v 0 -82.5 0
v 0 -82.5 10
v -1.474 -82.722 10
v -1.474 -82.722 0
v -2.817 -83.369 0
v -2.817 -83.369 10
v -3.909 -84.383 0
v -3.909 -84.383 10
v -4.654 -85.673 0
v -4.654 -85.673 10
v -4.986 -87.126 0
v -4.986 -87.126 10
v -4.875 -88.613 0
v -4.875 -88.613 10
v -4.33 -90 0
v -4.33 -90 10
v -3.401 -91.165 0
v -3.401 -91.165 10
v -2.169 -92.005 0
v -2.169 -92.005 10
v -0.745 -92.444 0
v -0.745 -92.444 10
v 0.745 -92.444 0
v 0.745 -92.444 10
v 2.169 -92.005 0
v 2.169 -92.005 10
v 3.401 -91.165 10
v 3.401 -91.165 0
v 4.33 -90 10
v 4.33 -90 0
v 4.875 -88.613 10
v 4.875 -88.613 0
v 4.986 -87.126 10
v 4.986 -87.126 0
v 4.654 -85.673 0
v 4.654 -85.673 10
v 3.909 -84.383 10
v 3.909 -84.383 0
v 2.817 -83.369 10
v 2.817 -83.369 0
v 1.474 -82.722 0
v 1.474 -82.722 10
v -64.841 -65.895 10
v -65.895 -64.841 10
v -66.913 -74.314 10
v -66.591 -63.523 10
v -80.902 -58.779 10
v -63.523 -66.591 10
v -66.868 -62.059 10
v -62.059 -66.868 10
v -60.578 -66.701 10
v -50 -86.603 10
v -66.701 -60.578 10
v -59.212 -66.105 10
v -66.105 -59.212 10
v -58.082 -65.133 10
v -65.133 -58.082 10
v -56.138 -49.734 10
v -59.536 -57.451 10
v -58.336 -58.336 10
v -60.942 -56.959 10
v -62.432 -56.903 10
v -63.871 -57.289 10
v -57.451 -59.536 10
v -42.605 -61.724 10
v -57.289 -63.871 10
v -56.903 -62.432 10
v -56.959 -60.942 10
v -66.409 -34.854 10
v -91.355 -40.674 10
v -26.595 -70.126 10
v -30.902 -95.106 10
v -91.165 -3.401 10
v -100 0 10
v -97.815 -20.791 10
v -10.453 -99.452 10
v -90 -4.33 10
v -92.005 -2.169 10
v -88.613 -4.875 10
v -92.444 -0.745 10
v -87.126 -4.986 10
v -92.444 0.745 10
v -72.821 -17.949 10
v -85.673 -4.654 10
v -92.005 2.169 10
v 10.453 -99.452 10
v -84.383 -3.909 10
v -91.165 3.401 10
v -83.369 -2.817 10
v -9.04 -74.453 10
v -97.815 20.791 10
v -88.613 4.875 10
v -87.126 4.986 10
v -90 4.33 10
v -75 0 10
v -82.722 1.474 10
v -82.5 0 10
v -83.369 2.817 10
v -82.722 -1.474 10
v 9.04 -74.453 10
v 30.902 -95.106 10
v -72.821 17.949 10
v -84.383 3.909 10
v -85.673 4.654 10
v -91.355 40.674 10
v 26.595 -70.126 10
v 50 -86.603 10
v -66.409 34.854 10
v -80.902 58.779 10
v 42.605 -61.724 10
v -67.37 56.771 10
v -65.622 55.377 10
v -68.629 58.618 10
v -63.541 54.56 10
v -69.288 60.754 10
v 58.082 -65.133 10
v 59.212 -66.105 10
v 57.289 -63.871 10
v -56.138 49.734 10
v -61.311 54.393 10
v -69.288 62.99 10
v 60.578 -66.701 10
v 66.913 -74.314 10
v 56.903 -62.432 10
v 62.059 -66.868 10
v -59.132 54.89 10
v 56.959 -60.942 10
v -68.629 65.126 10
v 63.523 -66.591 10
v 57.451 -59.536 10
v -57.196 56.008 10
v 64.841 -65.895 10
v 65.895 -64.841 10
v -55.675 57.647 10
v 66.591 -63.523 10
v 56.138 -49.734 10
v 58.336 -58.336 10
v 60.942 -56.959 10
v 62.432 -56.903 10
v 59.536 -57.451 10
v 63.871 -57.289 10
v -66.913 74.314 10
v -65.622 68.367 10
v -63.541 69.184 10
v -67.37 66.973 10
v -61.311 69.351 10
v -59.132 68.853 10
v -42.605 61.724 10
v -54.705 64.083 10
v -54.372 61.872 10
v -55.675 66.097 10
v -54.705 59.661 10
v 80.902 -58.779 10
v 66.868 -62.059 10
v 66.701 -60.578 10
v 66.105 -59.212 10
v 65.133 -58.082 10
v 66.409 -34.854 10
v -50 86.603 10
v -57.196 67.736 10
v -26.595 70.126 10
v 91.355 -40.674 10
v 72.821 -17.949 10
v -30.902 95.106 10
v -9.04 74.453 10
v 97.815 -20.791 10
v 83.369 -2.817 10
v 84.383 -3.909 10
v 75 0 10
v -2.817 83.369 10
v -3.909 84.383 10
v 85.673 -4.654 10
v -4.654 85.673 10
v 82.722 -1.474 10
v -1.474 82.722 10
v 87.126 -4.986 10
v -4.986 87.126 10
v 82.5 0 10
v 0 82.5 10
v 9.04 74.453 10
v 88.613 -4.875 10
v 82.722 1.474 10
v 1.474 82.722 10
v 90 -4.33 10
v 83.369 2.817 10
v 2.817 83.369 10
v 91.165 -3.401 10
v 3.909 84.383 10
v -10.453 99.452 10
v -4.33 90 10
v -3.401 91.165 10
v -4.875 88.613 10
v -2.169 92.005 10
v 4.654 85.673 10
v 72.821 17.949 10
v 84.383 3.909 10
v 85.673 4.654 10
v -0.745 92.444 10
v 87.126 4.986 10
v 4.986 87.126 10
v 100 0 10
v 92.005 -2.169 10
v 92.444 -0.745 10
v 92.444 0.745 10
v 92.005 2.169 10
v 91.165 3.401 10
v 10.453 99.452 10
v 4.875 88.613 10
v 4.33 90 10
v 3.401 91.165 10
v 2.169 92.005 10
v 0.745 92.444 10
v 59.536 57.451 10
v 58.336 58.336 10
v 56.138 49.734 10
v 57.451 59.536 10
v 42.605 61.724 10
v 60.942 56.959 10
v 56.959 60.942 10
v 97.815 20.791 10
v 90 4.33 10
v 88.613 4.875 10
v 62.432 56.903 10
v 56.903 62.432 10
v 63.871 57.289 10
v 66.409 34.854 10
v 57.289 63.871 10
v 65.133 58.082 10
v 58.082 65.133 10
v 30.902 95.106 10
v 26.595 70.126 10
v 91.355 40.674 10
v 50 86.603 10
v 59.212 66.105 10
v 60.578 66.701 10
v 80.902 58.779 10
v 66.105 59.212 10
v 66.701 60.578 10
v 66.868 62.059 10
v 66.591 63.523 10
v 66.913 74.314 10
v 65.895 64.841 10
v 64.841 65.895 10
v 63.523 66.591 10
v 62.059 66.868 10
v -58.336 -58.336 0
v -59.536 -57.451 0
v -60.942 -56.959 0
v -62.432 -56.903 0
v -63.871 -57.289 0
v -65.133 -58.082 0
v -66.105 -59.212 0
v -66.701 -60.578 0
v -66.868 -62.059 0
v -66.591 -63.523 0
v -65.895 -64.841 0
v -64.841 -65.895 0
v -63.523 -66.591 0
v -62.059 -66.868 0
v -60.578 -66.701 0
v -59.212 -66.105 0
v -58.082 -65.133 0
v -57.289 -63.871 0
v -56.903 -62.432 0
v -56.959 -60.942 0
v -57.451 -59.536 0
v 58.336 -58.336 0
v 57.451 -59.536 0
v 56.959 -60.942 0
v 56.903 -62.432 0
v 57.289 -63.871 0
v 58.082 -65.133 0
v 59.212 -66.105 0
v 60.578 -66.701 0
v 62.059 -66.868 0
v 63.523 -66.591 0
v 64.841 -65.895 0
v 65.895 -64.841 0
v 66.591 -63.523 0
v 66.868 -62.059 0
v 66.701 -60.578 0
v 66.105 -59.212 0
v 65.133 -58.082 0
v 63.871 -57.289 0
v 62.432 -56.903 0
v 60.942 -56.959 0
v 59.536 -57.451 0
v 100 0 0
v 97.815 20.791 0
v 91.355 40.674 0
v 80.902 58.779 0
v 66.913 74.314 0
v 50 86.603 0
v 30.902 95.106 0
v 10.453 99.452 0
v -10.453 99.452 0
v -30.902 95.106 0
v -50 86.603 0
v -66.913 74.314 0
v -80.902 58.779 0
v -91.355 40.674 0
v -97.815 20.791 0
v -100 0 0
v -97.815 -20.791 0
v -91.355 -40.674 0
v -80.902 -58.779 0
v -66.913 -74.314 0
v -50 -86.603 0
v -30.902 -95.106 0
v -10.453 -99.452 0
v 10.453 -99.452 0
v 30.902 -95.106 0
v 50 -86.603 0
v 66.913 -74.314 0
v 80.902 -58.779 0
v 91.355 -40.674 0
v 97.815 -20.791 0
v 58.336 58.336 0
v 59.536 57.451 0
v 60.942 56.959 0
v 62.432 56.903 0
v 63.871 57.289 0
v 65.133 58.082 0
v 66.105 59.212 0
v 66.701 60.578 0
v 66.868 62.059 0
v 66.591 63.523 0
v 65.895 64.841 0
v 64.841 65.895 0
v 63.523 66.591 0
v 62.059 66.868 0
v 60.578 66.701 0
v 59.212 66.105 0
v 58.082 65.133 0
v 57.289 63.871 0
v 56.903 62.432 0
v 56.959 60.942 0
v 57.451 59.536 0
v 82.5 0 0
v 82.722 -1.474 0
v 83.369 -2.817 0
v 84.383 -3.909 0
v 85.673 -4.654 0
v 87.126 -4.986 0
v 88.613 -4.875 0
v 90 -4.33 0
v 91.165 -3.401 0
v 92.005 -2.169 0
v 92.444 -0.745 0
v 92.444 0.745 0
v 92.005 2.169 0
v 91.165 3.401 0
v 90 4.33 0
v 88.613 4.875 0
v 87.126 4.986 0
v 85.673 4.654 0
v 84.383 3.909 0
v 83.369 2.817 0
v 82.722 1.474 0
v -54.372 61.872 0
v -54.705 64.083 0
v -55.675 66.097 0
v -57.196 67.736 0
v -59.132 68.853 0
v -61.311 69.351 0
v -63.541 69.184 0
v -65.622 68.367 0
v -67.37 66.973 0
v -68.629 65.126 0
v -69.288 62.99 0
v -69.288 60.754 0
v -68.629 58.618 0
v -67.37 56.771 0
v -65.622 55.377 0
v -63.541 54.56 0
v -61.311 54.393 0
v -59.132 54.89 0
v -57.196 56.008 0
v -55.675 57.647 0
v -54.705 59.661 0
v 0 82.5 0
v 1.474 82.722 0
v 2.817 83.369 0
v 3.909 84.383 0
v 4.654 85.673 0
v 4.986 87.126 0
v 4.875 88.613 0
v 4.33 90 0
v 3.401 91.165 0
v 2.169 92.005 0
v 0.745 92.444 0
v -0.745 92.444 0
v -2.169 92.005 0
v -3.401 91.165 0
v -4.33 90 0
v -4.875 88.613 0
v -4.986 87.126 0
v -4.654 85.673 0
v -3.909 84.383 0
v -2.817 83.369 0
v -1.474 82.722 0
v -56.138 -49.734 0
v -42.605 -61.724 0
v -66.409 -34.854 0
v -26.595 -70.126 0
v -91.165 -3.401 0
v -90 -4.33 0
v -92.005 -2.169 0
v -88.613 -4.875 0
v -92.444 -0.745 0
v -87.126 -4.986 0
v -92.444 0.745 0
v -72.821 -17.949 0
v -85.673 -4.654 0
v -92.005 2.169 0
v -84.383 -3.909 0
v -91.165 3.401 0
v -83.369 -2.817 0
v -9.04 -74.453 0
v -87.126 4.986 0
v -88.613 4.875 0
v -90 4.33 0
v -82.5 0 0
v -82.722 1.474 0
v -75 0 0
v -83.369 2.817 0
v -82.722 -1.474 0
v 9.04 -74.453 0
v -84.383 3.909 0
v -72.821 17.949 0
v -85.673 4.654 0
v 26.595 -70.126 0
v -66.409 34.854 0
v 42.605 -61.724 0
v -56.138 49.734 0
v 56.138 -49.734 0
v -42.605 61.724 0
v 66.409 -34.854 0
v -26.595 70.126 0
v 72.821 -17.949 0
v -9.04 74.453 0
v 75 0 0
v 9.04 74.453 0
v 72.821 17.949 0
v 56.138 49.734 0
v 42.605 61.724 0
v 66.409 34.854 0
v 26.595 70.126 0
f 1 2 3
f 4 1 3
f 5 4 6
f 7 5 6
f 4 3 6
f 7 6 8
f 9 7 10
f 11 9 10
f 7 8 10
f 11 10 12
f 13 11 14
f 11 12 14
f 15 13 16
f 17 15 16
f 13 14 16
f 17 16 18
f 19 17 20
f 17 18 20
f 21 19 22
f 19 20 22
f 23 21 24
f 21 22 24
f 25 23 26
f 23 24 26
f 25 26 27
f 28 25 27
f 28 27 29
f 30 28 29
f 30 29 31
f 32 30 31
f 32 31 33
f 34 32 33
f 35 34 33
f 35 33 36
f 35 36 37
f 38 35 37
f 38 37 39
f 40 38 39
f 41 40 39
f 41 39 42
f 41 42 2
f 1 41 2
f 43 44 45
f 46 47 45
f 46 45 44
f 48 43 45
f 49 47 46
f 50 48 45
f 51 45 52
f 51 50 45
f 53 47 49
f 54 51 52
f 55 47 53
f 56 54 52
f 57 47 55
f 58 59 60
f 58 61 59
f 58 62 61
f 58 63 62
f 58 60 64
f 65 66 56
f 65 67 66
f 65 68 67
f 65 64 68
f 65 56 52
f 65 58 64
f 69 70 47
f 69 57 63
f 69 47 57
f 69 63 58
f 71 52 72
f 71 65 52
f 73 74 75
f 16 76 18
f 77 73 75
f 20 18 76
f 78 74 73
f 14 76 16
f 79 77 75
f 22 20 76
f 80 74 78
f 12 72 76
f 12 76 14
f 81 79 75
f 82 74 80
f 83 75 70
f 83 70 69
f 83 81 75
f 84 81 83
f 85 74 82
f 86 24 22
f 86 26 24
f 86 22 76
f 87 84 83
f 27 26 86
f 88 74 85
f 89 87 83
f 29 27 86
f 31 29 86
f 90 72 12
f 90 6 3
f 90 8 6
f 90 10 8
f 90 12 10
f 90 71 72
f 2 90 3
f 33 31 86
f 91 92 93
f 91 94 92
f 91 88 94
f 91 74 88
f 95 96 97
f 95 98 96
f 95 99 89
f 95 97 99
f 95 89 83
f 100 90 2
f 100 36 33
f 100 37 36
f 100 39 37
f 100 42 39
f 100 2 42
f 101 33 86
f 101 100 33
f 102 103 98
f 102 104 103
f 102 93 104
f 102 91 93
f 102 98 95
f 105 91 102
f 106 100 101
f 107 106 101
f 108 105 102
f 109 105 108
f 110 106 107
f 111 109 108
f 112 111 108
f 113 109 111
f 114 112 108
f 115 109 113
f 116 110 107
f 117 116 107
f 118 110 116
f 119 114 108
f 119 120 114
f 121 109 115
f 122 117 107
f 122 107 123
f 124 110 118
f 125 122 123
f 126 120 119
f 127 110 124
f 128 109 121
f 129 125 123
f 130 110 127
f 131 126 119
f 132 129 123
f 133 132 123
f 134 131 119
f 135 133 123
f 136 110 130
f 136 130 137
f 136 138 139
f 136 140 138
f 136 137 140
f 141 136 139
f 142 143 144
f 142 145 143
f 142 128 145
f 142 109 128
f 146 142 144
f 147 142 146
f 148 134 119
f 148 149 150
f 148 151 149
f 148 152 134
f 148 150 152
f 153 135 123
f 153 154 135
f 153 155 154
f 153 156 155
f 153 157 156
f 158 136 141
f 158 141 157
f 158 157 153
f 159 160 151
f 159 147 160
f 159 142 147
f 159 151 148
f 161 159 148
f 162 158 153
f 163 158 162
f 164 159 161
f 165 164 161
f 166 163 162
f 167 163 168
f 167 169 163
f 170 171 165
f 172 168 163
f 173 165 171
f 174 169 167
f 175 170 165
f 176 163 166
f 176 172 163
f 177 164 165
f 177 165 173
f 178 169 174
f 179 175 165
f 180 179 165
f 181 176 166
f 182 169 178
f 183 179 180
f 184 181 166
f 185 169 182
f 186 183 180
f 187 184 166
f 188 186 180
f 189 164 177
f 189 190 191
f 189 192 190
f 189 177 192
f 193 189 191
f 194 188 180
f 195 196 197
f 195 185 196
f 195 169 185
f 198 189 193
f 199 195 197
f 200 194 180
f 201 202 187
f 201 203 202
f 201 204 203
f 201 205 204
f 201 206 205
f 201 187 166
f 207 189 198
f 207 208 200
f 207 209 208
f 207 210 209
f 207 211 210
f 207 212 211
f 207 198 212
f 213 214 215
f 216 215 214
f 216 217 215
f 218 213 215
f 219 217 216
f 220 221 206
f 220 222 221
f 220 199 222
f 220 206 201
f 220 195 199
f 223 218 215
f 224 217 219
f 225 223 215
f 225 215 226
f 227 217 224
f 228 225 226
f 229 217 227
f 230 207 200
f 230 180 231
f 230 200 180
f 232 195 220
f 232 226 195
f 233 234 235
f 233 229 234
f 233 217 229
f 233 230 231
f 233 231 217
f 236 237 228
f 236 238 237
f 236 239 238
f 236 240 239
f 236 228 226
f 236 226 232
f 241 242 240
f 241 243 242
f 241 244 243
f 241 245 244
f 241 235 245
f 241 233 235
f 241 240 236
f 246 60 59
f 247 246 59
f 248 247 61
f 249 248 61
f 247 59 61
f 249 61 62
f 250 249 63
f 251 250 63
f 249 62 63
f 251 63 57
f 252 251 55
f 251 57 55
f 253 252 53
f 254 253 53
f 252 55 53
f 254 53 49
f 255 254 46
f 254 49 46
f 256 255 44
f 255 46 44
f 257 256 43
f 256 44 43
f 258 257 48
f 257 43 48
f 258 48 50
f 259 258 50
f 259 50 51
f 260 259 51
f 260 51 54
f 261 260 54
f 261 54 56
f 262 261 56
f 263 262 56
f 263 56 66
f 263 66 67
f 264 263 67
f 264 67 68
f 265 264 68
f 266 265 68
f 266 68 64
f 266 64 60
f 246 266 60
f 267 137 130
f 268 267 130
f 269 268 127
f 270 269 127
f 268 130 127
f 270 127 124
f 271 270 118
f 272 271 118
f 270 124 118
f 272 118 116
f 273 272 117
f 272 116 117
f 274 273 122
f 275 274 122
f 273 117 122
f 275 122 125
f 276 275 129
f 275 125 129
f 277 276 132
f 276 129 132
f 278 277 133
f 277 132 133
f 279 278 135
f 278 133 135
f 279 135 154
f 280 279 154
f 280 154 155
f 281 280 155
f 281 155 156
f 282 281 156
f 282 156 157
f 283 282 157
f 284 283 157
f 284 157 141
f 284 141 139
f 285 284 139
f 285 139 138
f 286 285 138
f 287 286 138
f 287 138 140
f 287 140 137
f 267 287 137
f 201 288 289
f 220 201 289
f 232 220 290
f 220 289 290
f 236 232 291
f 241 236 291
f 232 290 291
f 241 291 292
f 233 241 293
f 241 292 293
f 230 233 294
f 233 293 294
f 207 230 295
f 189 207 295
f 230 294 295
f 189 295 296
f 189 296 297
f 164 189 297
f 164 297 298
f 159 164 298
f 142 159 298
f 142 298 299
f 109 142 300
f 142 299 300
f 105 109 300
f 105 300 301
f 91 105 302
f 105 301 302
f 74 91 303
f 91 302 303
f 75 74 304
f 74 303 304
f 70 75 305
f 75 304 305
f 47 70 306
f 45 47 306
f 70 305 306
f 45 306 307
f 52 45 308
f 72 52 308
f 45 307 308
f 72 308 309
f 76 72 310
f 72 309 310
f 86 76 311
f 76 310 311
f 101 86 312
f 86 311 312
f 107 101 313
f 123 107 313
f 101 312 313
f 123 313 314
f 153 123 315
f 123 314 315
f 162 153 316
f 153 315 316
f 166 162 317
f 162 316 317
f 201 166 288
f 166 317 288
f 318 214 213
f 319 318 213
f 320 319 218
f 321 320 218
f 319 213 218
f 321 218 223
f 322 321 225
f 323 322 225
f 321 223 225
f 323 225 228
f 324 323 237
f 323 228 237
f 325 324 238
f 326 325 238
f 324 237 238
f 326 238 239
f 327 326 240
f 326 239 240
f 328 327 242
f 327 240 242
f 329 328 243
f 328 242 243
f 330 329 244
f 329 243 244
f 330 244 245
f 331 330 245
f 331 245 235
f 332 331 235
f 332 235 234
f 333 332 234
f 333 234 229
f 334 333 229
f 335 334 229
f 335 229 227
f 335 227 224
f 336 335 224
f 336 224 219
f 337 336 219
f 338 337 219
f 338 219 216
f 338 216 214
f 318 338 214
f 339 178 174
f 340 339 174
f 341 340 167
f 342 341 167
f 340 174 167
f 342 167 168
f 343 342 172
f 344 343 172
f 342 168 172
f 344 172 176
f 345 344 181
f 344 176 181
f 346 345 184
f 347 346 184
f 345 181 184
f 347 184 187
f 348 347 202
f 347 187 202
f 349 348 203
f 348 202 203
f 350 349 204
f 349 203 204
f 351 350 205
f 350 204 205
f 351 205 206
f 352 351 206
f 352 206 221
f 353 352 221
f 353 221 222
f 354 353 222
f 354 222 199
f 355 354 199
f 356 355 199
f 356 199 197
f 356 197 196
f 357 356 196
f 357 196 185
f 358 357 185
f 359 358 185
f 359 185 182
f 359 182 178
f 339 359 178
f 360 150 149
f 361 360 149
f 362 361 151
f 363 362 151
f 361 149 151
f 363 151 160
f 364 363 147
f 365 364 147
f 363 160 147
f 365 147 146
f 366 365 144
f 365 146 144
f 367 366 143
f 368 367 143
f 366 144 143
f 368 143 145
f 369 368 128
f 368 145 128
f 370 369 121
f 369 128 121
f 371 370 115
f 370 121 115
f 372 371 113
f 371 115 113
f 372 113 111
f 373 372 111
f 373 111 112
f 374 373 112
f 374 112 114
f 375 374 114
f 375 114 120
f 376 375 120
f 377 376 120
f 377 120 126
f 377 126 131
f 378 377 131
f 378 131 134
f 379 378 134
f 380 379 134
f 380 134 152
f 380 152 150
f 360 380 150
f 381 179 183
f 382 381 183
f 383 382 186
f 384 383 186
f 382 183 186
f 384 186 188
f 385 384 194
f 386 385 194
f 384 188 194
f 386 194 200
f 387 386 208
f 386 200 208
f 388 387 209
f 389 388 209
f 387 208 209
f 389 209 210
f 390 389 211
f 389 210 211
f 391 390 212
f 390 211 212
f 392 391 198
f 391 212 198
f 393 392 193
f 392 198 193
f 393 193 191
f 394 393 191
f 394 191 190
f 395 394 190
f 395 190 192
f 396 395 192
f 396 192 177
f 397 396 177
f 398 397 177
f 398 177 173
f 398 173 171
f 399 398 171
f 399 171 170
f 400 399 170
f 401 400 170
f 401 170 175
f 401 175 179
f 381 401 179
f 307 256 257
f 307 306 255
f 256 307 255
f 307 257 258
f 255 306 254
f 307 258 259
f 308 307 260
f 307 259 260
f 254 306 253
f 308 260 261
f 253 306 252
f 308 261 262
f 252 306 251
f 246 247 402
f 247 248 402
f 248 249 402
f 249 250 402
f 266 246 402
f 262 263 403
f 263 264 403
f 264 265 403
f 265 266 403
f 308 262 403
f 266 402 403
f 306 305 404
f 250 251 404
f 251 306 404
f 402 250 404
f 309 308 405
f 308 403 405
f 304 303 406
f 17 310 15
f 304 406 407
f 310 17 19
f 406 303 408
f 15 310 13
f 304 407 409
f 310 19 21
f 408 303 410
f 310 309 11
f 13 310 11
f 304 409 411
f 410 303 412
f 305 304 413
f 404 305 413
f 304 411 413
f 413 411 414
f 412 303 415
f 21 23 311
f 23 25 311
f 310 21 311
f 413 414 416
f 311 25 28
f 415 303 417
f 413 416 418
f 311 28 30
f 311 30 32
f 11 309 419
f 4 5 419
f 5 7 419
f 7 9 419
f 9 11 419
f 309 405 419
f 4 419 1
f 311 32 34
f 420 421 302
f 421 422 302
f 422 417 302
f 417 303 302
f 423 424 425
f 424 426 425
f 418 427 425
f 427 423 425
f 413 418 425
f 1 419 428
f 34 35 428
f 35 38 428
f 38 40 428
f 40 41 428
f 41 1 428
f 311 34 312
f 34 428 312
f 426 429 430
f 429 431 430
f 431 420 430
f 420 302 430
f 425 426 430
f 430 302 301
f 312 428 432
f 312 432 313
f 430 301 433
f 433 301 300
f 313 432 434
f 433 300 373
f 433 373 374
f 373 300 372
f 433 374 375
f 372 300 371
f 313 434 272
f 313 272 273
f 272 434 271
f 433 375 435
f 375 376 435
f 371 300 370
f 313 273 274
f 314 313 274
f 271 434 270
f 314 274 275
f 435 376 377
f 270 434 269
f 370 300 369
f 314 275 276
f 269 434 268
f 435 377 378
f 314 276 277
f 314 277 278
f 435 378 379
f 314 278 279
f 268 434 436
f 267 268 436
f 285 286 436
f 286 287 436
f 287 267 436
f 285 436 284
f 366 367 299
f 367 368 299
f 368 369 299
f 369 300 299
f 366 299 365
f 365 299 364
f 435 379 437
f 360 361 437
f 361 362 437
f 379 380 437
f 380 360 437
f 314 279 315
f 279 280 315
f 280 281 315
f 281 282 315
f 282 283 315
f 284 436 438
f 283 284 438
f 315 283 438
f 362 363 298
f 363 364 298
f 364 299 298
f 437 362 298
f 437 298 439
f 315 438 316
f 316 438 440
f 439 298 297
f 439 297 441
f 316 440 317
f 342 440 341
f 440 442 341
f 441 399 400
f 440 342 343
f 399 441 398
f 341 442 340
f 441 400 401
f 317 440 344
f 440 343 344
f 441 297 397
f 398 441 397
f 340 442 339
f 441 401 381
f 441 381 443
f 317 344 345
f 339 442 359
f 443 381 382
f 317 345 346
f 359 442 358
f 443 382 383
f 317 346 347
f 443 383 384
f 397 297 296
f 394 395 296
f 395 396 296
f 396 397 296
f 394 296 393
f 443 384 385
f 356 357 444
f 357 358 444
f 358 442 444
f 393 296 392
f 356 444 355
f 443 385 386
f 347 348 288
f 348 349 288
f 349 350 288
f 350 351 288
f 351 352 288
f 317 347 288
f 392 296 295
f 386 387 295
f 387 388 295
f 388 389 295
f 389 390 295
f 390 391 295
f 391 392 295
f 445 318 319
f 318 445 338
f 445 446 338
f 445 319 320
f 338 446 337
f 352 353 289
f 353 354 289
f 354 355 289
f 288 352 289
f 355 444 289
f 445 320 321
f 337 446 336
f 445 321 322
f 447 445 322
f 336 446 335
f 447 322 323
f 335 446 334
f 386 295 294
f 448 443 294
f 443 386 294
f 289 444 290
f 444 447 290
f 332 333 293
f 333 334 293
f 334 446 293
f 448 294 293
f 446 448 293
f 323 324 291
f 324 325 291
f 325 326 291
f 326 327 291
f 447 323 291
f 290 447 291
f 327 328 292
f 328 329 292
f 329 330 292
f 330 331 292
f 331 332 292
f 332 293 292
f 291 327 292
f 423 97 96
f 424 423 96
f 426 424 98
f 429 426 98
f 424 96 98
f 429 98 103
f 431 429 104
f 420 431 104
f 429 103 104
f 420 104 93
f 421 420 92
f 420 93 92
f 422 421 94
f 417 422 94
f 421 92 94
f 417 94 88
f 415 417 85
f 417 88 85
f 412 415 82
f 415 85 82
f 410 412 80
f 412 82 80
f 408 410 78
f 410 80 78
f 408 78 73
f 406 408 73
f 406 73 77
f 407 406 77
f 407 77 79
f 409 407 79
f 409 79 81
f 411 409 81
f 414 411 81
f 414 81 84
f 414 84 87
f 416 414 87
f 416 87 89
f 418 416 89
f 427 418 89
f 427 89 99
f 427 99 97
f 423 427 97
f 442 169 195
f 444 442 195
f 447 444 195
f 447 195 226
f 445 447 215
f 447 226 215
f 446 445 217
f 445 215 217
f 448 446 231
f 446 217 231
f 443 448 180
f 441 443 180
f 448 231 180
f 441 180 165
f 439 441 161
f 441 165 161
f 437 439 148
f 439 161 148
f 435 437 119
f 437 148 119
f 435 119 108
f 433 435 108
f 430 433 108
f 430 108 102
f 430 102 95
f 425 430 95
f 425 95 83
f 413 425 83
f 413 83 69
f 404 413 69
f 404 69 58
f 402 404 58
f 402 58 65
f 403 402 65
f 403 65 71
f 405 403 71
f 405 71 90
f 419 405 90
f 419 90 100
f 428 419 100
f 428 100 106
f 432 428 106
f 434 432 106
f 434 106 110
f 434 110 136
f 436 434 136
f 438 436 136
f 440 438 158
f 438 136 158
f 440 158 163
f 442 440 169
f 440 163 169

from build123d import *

# Parameters (mm, degrees)
F0_R            = 100
F1_DEPTH        = 10
F2_R            = 75
F3_DEPTH        = 10.001
F4_R            = 5
F5_DEPTH        = 10.001
F5_COPIES_COUNT = 7
F5_COPIES_ANGLE = 270
F8_R            = 7.5
F9_DEPTH        = 10.001


# Not quite as in the source:
# - a pattern or mirror of a feature is missing from the dataset's text; its kind, count and spacing are read off the source's solid


with BuildPart() as f1:
    # F0 (on Top) → F1 (new body)
    with BuildSketch(Plane.XY):
        Circle(F0_R)
    extrude(amount=F1_DEPTH)

    # F2 (on face) → F3 (cut, through all)
    with BuildSketch(Plane.XY.offset(10)):
        Circle(F2_R)
    extrude(amount=-F3_DEPTH, mode=Mode.SUBTRACT)

    # F4 (on face) → F5 (cut, through all)
    with BuildSketch(Plane.XY.offset(10)):
        with Locations((-87.5, 0)):
            Circle(F4_R)
    f5 = extrude(amount=-F5_DEPTH, mode=Mode.SUBTRACT)

    # F5_copies: F5 ×7 about axis
    f5_copies_axis = Axis((0, 0, 0), (0, 0, 1))
    for i in range(1, F5_COPIES_COUNT):
        add(f5.rotate(f5_copies_axis, i * F5_COPIES_ANGLE / (F5_COPIES_COUNT - 1)), mode=Mode.SUBTRACT)

    # F8 (on face) → F9 (cut, through all)
    with BuildSketch(Plane.XY.offset(10)):
        with Locations((-61.8718433538, 61.8718433538)):
            Circle(F8_R)
    extrude(amount=-F9_DEPTH, mode=Mode.SUBTRACT)


solid = f1.part
